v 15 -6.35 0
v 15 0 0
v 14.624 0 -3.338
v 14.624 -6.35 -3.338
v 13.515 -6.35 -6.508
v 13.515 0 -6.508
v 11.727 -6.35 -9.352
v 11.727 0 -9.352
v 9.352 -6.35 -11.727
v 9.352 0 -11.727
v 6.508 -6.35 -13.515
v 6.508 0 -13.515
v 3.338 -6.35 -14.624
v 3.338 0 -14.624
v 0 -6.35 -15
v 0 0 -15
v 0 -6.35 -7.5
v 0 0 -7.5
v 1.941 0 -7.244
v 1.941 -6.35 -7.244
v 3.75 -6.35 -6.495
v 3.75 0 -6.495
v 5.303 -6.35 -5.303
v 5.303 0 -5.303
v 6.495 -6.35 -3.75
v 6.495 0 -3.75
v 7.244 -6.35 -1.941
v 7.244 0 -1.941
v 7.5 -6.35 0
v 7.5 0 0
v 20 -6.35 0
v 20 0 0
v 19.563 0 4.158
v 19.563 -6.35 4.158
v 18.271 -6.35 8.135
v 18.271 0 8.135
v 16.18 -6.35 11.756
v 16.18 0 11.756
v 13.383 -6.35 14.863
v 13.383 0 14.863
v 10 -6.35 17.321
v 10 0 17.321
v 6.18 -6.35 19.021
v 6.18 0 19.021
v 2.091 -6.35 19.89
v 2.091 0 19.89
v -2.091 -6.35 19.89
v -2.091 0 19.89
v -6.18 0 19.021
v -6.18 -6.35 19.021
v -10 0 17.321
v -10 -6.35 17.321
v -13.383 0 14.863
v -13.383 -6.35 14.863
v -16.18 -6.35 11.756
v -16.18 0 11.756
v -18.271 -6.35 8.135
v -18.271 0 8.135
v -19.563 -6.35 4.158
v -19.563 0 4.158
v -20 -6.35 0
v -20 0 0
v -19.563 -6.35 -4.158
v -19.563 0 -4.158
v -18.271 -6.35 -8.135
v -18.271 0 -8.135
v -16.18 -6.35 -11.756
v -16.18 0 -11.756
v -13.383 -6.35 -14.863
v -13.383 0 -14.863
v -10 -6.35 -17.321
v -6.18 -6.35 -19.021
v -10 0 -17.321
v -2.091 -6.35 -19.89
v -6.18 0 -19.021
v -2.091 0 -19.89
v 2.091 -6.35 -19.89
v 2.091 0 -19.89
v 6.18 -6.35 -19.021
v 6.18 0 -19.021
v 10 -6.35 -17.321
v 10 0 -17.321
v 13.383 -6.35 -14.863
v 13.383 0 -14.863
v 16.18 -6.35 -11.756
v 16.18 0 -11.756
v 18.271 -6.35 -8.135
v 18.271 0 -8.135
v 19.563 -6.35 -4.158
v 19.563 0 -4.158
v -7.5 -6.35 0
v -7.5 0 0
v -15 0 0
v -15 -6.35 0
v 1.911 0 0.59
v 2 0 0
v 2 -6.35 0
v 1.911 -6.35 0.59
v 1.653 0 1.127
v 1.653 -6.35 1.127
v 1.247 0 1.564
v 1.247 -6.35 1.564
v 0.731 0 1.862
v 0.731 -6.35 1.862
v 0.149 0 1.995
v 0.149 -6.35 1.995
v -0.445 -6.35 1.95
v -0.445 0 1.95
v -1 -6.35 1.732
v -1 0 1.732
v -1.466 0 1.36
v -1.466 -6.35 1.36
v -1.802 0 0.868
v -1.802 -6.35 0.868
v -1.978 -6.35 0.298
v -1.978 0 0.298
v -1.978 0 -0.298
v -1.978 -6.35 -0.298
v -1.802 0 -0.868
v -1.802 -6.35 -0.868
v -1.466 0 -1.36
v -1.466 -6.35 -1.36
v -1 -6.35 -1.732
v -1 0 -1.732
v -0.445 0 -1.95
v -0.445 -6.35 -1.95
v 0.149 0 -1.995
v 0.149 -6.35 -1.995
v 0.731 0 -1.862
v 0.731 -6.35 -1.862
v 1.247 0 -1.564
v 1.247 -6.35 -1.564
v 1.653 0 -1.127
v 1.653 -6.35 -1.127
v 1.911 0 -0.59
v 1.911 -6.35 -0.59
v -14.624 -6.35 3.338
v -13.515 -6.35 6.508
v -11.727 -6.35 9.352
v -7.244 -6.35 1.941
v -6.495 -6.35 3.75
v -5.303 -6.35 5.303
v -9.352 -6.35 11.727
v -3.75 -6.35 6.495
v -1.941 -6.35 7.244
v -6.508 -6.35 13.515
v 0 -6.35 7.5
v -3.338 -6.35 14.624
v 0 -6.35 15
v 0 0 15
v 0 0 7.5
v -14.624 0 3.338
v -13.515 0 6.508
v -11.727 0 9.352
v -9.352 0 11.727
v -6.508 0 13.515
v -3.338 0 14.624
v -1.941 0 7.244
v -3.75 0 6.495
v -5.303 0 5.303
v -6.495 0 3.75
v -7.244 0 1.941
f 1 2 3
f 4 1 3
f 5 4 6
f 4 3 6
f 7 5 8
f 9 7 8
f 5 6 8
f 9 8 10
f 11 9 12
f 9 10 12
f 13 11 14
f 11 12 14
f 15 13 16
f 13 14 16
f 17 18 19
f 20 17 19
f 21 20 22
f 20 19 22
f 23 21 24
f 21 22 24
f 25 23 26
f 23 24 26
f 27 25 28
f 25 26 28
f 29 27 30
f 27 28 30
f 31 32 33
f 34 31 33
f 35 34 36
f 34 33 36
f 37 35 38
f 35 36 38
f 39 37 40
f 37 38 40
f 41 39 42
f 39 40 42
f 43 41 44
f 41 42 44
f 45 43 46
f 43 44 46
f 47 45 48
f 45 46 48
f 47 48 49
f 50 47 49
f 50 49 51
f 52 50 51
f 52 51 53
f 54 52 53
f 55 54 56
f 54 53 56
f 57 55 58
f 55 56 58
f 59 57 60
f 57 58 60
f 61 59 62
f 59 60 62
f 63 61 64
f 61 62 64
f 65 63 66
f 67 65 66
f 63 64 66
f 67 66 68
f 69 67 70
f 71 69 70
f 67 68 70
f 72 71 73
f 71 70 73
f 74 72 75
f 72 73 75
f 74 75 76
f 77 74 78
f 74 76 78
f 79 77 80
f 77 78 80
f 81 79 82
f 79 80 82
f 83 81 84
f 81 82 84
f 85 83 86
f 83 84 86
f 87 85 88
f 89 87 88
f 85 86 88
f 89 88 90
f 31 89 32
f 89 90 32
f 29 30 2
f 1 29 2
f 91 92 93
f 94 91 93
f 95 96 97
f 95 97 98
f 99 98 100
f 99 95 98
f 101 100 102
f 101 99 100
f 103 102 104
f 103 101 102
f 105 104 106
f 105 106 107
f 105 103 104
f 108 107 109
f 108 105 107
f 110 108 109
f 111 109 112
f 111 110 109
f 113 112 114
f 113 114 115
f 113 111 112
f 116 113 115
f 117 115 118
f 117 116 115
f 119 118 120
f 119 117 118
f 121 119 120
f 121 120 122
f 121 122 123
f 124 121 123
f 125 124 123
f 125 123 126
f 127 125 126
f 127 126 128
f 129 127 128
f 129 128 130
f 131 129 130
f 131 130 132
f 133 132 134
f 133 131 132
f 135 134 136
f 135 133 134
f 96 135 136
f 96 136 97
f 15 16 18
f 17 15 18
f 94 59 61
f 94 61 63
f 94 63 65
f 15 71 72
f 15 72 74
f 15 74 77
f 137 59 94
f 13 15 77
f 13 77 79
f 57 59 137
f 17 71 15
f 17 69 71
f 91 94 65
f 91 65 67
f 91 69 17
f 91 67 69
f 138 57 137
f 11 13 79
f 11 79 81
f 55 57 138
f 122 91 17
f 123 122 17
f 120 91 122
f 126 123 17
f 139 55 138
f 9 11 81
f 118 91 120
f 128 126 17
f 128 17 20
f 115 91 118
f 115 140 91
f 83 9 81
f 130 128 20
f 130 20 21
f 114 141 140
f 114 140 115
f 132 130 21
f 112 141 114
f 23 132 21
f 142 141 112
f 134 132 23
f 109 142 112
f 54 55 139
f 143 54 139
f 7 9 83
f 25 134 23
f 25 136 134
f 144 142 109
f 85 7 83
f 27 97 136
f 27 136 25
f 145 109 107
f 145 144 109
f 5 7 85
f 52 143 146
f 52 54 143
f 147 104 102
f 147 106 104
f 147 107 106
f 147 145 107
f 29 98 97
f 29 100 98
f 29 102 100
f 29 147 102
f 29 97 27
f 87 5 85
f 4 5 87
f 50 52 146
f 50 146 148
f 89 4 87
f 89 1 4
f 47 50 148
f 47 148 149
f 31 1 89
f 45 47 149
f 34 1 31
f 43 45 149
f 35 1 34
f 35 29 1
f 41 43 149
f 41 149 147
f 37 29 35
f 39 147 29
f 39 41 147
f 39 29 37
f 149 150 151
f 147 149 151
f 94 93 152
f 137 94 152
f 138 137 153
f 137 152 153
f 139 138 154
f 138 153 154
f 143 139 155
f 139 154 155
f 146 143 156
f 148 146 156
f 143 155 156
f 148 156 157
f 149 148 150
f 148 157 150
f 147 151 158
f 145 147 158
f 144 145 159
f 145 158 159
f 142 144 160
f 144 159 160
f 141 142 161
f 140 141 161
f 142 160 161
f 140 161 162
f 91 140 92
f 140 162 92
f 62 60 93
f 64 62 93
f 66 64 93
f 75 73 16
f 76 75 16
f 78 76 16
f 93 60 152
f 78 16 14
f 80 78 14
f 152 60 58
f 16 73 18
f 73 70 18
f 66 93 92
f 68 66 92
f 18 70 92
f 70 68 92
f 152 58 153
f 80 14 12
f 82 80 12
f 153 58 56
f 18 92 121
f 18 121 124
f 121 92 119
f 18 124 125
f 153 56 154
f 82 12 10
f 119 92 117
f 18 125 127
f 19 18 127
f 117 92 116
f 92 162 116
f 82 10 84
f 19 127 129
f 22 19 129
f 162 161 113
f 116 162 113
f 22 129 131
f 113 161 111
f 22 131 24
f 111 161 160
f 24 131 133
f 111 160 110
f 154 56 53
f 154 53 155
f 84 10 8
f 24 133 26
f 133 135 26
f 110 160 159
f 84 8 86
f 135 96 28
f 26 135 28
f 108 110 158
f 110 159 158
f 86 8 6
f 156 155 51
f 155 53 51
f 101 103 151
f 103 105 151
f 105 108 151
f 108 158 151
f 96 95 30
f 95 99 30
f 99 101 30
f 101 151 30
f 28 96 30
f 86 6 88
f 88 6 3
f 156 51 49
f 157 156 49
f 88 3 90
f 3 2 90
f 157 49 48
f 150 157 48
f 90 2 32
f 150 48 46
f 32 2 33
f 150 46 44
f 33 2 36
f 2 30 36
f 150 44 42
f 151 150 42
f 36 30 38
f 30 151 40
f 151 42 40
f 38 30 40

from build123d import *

# Parameters (mm, degrees)
F0_R     = 20
F0_R_2   = 2.0000994159
F1_DEPTH = 6.35


# Not quite as in the source:
# - a length typed as a fraction of an inch, garbled in the dataset ("3 / 203.2 mm" for 3/8 in), is restored


with BuildPart() as f1:
    # F0 (on Front) → F1 (new body)
    with BuildSketch(Plane.XZ):
        Circle(F0_R)
        with BuildLine():
            ThreePointArc((0, 15), (10.6066017178, 10.6066017178), (15, 0))
            ThreePointArc((15, 0), (10.6066017178, -10.6066017178), (0, -15))
            ThreePointArc((0, -15), (-10.6066017178, -10.6066017178), (-15, 0))
            ThreePointArc((-15, 0), (-10.6066017178, 10.6066017178), (0, 15))
        make_face(mode=Mode.SUBTRACT)
        with BuildLine():
            ThreePointArc((0, -7.5), (5.3033008589, -5.3033008589), (7.5, 0))
            ThreePointArc((7.5, 0), (5.3033008589, 5.3033008589), (0, 7.5))
            ThreePointArc((0, 7.5), (-5.3033008589, 5.3033008589), (-7.5, 0))
            ThreePointArc((-7.5, 0), (-5.3033008589, -5.3033008589), (0, -7.5))
        make_face()
        Circle(F0_R_2, mode=Mode.SUBTRACT)
        with BuildLine():
            ThreePointArc((-15, 0), (-10.6066017178, -10.6066017178), (0, -15))
            Line((0, -15), (0, -7.5))
            ThreePointArc((0, -7.5), (-5.3033008589, -5.3033008589), (-7.5, 0))
            Line((-7.5, 0), (-15, 0))
        make_face()
        with BuildLine():
            Line((7.5, 0), (15, 0))
            ThreePointArc((15, 0), (10.6066017178, 10.6066017178), (0, 15))
            Line((0, 15), (0, 7.5))
            ThreePointArc((0, 7.5), (5.3033008589, 5.3033008589), (7.5, 0))
        make_face()
    extrude(amount=F1_DEPTH)


solid = f1.part
